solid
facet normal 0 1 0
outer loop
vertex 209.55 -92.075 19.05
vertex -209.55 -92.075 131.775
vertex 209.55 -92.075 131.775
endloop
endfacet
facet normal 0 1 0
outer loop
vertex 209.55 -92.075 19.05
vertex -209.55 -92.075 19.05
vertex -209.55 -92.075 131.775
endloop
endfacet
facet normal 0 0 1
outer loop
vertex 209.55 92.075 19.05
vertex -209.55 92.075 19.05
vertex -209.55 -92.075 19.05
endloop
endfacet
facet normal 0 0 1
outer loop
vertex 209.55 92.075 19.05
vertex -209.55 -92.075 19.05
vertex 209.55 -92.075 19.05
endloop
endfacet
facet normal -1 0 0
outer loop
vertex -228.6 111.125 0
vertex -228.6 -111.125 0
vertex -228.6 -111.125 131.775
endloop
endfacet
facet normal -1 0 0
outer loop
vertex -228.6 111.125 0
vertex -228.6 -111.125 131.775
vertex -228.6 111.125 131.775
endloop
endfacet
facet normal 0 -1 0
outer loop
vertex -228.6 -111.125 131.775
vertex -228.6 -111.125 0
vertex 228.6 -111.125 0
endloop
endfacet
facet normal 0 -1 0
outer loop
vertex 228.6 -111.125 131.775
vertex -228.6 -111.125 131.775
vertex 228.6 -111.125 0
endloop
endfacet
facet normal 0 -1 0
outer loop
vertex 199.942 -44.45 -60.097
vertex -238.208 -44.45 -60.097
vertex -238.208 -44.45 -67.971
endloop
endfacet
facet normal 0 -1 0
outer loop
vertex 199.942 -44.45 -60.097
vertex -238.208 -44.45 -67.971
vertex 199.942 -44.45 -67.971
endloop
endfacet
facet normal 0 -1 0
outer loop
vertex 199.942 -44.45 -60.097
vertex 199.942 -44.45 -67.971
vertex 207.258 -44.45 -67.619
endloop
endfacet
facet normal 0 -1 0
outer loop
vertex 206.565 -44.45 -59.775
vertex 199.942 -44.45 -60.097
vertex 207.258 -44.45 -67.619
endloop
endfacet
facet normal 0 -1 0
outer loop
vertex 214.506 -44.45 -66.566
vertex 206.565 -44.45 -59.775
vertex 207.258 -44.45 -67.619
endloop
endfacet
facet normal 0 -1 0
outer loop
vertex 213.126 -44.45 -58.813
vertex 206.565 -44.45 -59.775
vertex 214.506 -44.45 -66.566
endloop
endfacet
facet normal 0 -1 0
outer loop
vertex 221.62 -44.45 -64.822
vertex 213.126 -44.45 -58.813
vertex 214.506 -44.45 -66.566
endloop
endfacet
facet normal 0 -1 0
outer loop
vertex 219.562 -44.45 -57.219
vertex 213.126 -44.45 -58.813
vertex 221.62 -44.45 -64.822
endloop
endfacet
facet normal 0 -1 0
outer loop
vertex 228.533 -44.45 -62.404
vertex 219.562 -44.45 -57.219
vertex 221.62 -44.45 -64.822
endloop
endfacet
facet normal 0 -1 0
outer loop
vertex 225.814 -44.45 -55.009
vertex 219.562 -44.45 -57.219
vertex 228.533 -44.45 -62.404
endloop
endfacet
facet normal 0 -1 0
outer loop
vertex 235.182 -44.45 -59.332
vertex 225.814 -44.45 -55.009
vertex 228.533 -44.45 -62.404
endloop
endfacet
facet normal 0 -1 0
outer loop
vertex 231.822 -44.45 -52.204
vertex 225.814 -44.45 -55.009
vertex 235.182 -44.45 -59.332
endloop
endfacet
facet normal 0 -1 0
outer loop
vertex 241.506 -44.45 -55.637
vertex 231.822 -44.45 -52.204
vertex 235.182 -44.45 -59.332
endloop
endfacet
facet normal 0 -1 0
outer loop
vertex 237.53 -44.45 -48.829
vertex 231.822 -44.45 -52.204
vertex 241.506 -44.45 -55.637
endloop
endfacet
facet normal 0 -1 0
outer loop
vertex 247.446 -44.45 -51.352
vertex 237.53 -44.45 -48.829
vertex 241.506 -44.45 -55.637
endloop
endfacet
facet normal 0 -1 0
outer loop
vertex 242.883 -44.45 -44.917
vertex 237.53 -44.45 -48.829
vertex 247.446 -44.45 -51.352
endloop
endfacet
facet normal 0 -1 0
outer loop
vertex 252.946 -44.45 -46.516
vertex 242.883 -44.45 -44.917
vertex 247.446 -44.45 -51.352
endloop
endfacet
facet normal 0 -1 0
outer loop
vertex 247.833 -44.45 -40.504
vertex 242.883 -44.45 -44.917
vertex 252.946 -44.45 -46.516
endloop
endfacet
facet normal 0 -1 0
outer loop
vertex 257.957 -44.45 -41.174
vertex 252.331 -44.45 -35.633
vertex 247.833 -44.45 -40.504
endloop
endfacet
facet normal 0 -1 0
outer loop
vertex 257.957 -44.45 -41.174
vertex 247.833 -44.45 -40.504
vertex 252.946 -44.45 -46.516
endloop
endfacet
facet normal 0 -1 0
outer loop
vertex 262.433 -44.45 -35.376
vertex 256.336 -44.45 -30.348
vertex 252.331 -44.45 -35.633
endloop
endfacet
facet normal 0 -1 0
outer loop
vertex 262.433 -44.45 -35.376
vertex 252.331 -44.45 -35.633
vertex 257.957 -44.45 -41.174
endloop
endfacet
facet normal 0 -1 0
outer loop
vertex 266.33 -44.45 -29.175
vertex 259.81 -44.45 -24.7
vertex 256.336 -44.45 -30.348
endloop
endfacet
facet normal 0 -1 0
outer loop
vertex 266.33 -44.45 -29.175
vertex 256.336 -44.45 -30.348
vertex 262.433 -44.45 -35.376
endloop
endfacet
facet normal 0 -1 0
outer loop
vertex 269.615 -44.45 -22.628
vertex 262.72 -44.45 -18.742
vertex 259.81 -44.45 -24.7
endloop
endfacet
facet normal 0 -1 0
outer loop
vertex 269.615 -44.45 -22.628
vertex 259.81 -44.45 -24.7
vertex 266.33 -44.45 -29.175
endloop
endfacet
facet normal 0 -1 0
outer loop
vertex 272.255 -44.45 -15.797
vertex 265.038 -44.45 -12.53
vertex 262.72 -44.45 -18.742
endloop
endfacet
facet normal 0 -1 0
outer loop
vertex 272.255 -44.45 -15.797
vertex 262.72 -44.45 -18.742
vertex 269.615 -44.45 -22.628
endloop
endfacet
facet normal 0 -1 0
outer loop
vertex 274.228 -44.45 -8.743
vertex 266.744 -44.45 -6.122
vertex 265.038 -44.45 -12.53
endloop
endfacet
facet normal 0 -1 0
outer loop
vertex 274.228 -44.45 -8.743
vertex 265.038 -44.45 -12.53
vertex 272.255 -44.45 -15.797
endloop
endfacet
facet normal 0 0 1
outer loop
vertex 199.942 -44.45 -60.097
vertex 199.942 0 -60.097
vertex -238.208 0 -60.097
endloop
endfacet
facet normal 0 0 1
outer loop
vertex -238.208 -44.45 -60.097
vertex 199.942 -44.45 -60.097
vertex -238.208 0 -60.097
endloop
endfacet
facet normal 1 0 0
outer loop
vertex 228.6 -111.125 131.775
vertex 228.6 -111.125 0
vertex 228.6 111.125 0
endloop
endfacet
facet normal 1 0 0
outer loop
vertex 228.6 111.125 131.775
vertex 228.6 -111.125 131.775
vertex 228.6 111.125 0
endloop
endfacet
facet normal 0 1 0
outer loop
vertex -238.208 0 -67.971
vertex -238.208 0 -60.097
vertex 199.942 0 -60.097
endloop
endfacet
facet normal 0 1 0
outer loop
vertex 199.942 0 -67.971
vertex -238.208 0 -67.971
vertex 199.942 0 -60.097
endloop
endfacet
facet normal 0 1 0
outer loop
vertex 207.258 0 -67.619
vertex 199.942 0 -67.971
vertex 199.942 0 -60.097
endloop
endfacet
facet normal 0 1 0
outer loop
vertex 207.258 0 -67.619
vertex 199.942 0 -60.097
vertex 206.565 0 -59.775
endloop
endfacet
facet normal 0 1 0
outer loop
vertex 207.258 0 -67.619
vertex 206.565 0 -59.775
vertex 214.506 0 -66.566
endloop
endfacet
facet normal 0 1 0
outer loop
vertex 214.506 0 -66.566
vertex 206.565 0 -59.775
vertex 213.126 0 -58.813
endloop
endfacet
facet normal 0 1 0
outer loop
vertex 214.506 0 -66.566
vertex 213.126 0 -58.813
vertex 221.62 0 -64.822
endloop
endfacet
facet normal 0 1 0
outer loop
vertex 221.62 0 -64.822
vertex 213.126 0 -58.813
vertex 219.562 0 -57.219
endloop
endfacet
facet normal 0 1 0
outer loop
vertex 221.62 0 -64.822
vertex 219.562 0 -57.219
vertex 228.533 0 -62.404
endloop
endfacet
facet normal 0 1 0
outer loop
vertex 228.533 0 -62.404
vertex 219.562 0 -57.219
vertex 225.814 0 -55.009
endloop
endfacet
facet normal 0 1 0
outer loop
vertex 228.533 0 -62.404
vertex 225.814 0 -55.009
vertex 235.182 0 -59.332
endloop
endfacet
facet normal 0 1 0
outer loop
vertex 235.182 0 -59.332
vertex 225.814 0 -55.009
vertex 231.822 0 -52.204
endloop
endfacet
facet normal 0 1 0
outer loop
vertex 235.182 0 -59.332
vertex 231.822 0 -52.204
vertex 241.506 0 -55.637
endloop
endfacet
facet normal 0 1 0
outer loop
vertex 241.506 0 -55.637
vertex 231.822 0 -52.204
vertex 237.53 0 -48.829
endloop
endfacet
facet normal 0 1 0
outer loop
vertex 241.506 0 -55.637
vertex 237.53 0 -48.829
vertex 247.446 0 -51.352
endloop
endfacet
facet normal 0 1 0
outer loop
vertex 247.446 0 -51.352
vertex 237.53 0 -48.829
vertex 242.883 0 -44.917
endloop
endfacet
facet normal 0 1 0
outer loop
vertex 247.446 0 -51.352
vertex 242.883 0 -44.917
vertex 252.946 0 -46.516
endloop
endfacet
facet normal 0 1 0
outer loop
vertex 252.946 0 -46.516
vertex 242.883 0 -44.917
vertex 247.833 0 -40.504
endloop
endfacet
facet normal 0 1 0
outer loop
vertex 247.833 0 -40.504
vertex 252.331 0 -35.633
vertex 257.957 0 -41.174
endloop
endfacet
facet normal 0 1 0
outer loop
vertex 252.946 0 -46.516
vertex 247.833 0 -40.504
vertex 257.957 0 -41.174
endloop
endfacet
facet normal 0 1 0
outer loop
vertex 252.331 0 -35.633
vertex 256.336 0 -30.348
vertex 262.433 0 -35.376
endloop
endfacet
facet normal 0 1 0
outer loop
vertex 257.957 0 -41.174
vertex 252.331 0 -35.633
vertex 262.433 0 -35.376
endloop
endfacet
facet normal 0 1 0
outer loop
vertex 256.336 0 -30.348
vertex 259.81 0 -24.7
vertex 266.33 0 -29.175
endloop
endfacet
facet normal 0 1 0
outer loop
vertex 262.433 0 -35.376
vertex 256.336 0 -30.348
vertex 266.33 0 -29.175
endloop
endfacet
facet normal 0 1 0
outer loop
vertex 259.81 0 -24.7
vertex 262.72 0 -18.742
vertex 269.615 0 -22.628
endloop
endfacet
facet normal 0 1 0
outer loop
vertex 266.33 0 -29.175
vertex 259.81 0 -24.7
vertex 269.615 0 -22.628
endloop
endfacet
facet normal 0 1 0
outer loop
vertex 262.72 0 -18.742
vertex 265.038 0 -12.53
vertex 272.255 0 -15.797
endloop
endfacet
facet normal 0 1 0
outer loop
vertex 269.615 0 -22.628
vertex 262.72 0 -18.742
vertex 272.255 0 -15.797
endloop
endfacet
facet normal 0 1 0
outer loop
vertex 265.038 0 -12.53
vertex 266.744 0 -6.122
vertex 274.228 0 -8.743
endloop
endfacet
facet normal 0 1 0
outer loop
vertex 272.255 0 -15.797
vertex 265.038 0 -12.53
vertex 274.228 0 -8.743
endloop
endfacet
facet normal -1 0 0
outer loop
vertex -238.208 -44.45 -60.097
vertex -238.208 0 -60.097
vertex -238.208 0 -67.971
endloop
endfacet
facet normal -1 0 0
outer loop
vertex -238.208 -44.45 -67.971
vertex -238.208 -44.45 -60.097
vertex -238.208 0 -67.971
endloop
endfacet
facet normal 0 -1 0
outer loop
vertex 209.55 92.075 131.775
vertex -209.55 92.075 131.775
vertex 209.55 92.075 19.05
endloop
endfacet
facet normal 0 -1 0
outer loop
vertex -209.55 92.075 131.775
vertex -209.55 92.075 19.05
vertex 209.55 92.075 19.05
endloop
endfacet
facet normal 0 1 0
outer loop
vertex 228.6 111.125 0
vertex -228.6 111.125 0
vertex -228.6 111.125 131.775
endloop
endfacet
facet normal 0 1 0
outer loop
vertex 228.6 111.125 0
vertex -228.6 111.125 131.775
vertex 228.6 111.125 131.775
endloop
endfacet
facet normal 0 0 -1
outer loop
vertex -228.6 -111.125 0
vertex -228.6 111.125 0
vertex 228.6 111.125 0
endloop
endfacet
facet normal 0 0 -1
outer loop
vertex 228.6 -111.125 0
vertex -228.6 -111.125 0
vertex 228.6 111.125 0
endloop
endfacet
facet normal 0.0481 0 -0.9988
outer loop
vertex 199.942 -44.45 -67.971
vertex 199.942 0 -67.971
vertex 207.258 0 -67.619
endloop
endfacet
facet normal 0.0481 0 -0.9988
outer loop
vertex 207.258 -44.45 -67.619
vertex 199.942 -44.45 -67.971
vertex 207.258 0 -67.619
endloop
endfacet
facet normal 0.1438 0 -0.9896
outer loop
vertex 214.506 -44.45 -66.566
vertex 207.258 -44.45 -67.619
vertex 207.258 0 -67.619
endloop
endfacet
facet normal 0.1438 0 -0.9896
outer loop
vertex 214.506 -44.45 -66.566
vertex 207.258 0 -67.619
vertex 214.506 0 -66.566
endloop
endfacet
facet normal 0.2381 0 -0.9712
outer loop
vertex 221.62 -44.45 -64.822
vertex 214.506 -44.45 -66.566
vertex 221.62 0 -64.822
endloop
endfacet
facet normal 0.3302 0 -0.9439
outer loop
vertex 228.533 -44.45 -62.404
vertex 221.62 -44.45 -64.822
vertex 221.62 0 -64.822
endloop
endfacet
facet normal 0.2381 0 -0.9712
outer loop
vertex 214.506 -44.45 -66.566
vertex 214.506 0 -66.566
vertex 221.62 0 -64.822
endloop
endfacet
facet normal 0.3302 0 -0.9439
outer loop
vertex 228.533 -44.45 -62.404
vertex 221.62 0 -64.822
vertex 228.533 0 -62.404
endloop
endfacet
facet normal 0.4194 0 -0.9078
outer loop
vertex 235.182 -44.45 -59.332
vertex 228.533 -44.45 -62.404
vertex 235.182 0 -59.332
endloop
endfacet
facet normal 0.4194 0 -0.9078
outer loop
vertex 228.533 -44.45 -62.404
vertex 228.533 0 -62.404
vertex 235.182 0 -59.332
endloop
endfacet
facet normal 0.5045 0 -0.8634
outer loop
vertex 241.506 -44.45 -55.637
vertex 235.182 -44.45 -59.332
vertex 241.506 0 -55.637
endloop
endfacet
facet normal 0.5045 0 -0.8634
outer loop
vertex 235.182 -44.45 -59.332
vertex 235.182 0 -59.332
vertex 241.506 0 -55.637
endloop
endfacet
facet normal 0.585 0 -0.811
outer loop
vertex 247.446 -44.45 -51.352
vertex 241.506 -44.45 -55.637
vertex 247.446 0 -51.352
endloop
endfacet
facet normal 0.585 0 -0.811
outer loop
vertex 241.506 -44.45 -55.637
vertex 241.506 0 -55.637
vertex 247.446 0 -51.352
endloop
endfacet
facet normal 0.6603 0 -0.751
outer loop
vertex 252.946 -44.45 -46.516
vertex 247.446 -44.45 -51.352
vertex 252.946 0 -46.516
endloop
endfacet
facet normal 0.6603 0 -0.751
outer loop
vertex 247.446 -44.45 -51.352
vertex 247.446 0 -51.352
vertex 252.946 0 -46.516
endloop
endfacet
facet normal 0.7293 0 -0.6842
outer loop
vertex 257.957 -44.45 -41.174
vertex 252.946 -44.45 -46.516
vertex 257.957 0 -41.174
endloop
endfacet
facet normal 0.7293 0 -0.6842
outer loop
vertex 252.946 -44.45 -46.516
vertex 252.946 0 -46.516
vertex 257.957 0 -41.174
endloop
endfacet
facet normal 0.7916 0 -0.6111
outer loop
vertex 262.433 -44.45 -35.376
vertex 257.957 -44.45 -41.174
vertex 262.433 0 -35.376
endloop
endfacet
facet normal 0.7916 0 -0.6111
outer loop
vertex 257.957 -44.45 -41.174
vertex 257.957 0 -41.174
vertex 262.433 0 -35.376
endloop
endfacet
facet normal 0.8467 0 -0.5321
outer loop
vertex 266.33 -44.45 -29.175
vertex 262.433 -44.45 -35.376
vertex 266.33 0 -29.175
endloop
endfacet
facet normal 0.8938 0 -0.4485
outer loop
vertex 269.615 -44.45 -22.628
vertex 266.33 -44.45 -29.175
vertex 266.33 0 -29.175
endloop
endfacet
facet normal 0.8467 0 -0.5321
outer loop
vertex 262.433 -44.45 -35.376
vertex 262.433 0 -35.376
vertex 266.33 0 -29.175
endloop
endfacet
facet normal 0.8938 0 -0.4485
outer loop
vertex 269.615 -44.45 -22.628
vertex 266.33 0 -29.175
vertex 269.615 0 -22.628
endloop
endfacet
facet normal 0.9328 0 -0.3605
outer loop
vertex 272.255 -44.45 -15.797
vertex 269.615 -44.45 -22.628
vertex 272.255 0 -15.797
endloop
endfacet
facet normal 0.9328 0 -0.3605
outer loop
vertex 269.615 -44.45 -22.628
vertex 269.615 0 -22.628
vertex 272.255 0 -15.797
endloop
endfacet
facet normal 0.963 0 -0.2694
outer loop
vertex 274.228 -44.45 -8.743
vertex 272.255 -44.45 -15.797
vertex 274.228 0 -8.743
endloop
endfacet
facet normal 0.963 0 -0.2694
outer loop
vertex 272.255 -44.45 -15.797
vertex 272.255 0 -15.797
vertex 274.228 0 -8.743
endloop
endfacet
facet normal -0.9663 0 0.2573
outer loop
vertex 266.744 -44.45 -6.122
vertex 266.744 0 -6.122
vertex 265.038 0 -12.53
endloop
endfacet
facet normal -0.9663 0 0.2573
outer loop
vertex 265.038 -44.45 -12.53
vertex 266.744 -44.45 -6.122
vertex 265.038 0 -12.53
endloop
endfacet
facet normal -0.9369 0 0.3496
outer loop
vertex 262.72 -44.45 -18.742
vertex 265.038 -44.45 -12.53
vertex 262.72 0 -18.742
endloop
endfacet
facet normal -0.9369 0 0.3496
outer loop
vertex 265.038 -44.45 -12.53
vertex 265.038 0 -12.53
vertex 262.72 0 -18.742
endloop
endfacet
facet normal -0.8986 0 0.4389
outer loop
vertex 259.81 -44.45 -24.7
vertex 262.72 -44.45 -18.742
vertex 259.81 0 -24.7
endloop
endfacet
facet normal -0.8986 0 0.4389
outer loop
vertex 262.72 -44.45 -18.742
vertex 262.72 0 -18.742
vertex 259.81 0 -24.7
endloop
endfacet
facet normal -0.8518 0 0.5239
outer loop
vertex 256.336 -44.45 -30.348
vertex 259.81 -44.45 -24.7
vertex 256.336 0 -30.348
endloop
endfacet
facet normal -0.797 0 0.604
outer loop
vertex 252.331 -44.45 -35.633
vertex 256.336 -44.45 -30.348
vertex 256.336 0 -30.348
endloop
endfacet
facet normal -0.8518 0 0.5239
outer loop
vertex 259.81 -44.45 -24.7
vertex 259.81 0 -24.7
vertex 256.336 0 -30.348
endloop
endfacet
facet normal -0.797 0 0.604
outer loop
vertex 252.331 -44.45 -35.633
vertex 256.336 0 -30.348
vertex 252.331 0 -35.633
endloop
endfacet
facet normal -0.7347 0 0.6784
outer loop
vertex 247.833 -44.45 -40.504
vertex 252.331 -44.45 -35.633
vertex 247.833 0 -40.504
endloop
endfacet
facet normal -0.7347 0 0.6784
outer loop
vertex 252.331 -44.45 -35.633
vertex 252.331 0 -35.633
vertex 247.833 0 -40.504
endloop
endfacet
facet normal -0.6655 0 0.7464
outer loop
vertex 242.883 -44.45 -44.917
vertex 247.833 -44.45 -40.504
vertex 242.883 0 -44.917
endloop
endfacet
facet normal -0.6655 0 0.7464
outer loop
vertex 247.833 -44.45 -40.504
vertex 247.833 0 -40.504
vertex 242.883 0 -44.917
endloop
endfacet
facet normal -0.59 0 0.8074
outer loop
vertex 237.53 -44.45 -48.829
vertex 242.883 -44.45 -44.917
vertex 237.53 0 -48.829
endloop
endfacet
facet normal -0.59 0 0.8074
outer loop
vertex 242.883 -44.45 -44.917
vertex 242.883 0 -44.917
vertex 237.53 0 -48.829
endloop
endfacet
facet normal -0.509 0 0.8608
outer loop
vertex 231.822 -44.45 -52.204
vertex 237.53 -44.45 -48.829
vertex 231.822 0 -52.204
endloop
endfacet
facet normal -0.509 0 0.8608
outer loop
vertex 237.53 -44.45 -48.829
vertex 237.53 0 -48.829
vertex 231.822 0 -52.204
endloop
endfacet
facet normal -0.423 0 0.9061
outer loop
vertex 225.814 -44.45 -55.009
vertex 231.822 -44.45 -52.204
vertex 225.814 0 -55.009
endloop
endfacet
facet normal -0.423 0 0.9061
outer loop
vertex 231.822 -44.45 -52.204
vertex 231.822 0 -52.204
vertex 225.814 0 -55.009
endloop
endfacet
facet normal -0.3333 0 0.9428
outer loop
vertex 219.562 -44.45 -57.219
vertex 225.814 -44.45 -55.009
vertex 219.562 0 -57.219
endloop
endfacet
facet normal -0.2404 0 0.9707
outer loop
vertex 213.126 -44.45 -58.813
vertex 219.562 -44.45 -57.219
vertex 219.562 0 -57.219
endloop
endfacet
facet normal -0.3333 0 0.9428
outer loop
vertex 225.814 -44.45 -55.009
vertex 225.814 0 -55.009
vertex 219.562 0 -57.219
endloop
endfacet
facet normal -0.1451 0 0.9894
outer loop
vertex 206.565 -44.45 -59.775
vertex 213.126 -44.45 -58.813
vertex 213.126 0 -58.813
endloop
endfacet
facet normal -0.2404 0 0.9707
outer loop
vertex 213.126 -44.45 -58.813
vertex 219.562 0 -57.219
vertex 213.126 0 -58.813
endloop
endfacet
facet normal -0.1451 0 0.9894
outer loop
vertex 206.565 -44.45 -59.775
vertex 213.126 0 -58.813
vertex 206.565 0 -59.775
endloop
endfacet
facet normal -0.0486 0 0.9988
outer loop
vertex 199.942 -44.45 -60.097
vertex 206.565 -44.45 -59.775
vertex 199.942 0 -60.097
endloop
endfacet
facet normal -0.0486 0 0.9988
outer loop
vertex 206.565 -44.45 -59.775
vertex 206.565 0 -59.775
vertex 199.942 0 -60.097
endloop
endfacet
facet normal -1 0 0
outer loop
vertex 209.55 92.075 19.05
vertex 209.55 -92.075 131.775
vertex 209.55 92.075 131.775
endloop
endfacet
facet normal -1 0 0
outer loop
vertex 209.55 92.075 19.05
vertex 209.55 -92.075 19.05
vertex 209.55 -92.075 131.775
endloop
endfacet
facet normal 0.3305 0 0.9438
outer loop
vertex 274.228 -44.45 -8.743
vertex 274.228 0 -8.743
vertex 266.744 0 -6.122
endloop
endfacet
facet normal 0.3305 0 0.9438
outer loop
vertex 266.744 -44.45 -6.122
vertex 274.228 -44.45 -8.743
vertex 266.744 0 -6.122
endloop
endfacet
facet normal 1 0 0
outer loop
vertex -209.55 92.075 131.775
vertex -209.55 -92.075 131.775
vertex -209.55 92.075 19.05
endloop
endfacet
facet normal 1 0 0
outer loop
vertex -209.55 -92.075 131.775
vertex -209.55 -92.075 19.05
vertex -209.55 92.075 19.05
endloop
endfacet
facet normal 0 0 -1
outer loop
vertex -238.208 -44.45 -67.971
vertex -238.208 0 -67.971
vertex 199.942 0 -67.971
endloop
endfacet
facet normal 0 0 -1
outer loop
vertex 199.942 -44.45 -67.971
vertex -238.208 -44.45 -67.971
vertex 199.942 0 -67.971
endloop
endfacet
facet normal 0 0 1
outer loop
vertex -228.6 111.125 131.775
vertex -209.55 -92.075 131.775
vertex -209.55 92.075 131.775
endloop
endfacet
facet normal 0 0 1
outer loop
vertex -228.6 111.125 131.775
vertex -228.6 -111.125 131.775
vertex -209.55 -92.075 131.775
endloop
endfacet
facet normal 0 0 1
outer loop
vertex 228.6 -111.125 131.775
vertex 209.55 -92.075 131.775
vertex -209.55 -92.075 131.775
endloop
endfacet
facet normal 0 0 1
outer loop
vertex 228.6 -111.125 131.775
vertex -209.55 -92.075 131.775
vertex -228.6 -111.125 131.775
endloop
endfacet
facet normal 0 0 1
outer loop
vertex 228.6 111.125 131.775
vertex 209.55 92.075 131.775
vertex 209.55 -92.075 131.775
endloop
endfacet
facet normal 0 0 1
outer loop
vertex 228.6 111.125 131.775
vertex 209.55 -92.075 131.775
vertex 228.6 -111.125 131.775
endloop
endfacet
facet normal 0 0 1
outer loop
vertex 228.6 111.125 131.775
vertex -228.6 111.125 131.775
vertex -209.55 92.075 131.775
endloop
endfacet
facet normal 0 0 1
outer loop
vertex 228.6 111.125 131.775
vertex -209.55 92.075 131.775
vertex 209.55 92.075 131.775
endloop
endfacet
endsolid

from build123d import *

# Parameters (mm, degrees)
F0_W     = 457.2
F0_H     = 222.25
F1_DEPTH = 131.7752
F2_T     = -19.05
F4_DEPTH = 44.45


with BuildPart() as f1:
    # F0 (on Top) → F1 (new body)
    with BuildSketch(Plane.XY):
        Rectangle(F0_W, F0_H)
    extrude(amount=F1_DEPTH)

    # F2
    f2_openings = [f1.faces().sort_by_distance(p)[0] for p in [
        (0, 0, 131.7752),
    ]]
    offset(amount=F2_T, openings=f2_openings)


with BuildPart() as f4:
    # F3 (on Front) → F4 (new body)
    with BuildSketch(Plane.XZ):
        with BuildLine():
            Line((-238.207757, -60.096847), (-238.207757, -67.970847))
            Line((-238.207757, -67.970847), (199.942243, -67.970847))
            ThreePointArc((199.942243, -67.970847), (247.445641, -51.351609), (274.228034, -8.743214))
            Line((274.228034, -8.743214), (266.744122, -6.121847))
            ThreePointArc((266.744122, -6.121847), (242.883458, -44.916819), (199.942243, -60.096847))
            Line((199.942243, -60.096847), (-238.207757, -60.096847))
        make_face()
    extrude(amount=F4_DEPTH)


solid = Compound([f1.part, f4.part])
